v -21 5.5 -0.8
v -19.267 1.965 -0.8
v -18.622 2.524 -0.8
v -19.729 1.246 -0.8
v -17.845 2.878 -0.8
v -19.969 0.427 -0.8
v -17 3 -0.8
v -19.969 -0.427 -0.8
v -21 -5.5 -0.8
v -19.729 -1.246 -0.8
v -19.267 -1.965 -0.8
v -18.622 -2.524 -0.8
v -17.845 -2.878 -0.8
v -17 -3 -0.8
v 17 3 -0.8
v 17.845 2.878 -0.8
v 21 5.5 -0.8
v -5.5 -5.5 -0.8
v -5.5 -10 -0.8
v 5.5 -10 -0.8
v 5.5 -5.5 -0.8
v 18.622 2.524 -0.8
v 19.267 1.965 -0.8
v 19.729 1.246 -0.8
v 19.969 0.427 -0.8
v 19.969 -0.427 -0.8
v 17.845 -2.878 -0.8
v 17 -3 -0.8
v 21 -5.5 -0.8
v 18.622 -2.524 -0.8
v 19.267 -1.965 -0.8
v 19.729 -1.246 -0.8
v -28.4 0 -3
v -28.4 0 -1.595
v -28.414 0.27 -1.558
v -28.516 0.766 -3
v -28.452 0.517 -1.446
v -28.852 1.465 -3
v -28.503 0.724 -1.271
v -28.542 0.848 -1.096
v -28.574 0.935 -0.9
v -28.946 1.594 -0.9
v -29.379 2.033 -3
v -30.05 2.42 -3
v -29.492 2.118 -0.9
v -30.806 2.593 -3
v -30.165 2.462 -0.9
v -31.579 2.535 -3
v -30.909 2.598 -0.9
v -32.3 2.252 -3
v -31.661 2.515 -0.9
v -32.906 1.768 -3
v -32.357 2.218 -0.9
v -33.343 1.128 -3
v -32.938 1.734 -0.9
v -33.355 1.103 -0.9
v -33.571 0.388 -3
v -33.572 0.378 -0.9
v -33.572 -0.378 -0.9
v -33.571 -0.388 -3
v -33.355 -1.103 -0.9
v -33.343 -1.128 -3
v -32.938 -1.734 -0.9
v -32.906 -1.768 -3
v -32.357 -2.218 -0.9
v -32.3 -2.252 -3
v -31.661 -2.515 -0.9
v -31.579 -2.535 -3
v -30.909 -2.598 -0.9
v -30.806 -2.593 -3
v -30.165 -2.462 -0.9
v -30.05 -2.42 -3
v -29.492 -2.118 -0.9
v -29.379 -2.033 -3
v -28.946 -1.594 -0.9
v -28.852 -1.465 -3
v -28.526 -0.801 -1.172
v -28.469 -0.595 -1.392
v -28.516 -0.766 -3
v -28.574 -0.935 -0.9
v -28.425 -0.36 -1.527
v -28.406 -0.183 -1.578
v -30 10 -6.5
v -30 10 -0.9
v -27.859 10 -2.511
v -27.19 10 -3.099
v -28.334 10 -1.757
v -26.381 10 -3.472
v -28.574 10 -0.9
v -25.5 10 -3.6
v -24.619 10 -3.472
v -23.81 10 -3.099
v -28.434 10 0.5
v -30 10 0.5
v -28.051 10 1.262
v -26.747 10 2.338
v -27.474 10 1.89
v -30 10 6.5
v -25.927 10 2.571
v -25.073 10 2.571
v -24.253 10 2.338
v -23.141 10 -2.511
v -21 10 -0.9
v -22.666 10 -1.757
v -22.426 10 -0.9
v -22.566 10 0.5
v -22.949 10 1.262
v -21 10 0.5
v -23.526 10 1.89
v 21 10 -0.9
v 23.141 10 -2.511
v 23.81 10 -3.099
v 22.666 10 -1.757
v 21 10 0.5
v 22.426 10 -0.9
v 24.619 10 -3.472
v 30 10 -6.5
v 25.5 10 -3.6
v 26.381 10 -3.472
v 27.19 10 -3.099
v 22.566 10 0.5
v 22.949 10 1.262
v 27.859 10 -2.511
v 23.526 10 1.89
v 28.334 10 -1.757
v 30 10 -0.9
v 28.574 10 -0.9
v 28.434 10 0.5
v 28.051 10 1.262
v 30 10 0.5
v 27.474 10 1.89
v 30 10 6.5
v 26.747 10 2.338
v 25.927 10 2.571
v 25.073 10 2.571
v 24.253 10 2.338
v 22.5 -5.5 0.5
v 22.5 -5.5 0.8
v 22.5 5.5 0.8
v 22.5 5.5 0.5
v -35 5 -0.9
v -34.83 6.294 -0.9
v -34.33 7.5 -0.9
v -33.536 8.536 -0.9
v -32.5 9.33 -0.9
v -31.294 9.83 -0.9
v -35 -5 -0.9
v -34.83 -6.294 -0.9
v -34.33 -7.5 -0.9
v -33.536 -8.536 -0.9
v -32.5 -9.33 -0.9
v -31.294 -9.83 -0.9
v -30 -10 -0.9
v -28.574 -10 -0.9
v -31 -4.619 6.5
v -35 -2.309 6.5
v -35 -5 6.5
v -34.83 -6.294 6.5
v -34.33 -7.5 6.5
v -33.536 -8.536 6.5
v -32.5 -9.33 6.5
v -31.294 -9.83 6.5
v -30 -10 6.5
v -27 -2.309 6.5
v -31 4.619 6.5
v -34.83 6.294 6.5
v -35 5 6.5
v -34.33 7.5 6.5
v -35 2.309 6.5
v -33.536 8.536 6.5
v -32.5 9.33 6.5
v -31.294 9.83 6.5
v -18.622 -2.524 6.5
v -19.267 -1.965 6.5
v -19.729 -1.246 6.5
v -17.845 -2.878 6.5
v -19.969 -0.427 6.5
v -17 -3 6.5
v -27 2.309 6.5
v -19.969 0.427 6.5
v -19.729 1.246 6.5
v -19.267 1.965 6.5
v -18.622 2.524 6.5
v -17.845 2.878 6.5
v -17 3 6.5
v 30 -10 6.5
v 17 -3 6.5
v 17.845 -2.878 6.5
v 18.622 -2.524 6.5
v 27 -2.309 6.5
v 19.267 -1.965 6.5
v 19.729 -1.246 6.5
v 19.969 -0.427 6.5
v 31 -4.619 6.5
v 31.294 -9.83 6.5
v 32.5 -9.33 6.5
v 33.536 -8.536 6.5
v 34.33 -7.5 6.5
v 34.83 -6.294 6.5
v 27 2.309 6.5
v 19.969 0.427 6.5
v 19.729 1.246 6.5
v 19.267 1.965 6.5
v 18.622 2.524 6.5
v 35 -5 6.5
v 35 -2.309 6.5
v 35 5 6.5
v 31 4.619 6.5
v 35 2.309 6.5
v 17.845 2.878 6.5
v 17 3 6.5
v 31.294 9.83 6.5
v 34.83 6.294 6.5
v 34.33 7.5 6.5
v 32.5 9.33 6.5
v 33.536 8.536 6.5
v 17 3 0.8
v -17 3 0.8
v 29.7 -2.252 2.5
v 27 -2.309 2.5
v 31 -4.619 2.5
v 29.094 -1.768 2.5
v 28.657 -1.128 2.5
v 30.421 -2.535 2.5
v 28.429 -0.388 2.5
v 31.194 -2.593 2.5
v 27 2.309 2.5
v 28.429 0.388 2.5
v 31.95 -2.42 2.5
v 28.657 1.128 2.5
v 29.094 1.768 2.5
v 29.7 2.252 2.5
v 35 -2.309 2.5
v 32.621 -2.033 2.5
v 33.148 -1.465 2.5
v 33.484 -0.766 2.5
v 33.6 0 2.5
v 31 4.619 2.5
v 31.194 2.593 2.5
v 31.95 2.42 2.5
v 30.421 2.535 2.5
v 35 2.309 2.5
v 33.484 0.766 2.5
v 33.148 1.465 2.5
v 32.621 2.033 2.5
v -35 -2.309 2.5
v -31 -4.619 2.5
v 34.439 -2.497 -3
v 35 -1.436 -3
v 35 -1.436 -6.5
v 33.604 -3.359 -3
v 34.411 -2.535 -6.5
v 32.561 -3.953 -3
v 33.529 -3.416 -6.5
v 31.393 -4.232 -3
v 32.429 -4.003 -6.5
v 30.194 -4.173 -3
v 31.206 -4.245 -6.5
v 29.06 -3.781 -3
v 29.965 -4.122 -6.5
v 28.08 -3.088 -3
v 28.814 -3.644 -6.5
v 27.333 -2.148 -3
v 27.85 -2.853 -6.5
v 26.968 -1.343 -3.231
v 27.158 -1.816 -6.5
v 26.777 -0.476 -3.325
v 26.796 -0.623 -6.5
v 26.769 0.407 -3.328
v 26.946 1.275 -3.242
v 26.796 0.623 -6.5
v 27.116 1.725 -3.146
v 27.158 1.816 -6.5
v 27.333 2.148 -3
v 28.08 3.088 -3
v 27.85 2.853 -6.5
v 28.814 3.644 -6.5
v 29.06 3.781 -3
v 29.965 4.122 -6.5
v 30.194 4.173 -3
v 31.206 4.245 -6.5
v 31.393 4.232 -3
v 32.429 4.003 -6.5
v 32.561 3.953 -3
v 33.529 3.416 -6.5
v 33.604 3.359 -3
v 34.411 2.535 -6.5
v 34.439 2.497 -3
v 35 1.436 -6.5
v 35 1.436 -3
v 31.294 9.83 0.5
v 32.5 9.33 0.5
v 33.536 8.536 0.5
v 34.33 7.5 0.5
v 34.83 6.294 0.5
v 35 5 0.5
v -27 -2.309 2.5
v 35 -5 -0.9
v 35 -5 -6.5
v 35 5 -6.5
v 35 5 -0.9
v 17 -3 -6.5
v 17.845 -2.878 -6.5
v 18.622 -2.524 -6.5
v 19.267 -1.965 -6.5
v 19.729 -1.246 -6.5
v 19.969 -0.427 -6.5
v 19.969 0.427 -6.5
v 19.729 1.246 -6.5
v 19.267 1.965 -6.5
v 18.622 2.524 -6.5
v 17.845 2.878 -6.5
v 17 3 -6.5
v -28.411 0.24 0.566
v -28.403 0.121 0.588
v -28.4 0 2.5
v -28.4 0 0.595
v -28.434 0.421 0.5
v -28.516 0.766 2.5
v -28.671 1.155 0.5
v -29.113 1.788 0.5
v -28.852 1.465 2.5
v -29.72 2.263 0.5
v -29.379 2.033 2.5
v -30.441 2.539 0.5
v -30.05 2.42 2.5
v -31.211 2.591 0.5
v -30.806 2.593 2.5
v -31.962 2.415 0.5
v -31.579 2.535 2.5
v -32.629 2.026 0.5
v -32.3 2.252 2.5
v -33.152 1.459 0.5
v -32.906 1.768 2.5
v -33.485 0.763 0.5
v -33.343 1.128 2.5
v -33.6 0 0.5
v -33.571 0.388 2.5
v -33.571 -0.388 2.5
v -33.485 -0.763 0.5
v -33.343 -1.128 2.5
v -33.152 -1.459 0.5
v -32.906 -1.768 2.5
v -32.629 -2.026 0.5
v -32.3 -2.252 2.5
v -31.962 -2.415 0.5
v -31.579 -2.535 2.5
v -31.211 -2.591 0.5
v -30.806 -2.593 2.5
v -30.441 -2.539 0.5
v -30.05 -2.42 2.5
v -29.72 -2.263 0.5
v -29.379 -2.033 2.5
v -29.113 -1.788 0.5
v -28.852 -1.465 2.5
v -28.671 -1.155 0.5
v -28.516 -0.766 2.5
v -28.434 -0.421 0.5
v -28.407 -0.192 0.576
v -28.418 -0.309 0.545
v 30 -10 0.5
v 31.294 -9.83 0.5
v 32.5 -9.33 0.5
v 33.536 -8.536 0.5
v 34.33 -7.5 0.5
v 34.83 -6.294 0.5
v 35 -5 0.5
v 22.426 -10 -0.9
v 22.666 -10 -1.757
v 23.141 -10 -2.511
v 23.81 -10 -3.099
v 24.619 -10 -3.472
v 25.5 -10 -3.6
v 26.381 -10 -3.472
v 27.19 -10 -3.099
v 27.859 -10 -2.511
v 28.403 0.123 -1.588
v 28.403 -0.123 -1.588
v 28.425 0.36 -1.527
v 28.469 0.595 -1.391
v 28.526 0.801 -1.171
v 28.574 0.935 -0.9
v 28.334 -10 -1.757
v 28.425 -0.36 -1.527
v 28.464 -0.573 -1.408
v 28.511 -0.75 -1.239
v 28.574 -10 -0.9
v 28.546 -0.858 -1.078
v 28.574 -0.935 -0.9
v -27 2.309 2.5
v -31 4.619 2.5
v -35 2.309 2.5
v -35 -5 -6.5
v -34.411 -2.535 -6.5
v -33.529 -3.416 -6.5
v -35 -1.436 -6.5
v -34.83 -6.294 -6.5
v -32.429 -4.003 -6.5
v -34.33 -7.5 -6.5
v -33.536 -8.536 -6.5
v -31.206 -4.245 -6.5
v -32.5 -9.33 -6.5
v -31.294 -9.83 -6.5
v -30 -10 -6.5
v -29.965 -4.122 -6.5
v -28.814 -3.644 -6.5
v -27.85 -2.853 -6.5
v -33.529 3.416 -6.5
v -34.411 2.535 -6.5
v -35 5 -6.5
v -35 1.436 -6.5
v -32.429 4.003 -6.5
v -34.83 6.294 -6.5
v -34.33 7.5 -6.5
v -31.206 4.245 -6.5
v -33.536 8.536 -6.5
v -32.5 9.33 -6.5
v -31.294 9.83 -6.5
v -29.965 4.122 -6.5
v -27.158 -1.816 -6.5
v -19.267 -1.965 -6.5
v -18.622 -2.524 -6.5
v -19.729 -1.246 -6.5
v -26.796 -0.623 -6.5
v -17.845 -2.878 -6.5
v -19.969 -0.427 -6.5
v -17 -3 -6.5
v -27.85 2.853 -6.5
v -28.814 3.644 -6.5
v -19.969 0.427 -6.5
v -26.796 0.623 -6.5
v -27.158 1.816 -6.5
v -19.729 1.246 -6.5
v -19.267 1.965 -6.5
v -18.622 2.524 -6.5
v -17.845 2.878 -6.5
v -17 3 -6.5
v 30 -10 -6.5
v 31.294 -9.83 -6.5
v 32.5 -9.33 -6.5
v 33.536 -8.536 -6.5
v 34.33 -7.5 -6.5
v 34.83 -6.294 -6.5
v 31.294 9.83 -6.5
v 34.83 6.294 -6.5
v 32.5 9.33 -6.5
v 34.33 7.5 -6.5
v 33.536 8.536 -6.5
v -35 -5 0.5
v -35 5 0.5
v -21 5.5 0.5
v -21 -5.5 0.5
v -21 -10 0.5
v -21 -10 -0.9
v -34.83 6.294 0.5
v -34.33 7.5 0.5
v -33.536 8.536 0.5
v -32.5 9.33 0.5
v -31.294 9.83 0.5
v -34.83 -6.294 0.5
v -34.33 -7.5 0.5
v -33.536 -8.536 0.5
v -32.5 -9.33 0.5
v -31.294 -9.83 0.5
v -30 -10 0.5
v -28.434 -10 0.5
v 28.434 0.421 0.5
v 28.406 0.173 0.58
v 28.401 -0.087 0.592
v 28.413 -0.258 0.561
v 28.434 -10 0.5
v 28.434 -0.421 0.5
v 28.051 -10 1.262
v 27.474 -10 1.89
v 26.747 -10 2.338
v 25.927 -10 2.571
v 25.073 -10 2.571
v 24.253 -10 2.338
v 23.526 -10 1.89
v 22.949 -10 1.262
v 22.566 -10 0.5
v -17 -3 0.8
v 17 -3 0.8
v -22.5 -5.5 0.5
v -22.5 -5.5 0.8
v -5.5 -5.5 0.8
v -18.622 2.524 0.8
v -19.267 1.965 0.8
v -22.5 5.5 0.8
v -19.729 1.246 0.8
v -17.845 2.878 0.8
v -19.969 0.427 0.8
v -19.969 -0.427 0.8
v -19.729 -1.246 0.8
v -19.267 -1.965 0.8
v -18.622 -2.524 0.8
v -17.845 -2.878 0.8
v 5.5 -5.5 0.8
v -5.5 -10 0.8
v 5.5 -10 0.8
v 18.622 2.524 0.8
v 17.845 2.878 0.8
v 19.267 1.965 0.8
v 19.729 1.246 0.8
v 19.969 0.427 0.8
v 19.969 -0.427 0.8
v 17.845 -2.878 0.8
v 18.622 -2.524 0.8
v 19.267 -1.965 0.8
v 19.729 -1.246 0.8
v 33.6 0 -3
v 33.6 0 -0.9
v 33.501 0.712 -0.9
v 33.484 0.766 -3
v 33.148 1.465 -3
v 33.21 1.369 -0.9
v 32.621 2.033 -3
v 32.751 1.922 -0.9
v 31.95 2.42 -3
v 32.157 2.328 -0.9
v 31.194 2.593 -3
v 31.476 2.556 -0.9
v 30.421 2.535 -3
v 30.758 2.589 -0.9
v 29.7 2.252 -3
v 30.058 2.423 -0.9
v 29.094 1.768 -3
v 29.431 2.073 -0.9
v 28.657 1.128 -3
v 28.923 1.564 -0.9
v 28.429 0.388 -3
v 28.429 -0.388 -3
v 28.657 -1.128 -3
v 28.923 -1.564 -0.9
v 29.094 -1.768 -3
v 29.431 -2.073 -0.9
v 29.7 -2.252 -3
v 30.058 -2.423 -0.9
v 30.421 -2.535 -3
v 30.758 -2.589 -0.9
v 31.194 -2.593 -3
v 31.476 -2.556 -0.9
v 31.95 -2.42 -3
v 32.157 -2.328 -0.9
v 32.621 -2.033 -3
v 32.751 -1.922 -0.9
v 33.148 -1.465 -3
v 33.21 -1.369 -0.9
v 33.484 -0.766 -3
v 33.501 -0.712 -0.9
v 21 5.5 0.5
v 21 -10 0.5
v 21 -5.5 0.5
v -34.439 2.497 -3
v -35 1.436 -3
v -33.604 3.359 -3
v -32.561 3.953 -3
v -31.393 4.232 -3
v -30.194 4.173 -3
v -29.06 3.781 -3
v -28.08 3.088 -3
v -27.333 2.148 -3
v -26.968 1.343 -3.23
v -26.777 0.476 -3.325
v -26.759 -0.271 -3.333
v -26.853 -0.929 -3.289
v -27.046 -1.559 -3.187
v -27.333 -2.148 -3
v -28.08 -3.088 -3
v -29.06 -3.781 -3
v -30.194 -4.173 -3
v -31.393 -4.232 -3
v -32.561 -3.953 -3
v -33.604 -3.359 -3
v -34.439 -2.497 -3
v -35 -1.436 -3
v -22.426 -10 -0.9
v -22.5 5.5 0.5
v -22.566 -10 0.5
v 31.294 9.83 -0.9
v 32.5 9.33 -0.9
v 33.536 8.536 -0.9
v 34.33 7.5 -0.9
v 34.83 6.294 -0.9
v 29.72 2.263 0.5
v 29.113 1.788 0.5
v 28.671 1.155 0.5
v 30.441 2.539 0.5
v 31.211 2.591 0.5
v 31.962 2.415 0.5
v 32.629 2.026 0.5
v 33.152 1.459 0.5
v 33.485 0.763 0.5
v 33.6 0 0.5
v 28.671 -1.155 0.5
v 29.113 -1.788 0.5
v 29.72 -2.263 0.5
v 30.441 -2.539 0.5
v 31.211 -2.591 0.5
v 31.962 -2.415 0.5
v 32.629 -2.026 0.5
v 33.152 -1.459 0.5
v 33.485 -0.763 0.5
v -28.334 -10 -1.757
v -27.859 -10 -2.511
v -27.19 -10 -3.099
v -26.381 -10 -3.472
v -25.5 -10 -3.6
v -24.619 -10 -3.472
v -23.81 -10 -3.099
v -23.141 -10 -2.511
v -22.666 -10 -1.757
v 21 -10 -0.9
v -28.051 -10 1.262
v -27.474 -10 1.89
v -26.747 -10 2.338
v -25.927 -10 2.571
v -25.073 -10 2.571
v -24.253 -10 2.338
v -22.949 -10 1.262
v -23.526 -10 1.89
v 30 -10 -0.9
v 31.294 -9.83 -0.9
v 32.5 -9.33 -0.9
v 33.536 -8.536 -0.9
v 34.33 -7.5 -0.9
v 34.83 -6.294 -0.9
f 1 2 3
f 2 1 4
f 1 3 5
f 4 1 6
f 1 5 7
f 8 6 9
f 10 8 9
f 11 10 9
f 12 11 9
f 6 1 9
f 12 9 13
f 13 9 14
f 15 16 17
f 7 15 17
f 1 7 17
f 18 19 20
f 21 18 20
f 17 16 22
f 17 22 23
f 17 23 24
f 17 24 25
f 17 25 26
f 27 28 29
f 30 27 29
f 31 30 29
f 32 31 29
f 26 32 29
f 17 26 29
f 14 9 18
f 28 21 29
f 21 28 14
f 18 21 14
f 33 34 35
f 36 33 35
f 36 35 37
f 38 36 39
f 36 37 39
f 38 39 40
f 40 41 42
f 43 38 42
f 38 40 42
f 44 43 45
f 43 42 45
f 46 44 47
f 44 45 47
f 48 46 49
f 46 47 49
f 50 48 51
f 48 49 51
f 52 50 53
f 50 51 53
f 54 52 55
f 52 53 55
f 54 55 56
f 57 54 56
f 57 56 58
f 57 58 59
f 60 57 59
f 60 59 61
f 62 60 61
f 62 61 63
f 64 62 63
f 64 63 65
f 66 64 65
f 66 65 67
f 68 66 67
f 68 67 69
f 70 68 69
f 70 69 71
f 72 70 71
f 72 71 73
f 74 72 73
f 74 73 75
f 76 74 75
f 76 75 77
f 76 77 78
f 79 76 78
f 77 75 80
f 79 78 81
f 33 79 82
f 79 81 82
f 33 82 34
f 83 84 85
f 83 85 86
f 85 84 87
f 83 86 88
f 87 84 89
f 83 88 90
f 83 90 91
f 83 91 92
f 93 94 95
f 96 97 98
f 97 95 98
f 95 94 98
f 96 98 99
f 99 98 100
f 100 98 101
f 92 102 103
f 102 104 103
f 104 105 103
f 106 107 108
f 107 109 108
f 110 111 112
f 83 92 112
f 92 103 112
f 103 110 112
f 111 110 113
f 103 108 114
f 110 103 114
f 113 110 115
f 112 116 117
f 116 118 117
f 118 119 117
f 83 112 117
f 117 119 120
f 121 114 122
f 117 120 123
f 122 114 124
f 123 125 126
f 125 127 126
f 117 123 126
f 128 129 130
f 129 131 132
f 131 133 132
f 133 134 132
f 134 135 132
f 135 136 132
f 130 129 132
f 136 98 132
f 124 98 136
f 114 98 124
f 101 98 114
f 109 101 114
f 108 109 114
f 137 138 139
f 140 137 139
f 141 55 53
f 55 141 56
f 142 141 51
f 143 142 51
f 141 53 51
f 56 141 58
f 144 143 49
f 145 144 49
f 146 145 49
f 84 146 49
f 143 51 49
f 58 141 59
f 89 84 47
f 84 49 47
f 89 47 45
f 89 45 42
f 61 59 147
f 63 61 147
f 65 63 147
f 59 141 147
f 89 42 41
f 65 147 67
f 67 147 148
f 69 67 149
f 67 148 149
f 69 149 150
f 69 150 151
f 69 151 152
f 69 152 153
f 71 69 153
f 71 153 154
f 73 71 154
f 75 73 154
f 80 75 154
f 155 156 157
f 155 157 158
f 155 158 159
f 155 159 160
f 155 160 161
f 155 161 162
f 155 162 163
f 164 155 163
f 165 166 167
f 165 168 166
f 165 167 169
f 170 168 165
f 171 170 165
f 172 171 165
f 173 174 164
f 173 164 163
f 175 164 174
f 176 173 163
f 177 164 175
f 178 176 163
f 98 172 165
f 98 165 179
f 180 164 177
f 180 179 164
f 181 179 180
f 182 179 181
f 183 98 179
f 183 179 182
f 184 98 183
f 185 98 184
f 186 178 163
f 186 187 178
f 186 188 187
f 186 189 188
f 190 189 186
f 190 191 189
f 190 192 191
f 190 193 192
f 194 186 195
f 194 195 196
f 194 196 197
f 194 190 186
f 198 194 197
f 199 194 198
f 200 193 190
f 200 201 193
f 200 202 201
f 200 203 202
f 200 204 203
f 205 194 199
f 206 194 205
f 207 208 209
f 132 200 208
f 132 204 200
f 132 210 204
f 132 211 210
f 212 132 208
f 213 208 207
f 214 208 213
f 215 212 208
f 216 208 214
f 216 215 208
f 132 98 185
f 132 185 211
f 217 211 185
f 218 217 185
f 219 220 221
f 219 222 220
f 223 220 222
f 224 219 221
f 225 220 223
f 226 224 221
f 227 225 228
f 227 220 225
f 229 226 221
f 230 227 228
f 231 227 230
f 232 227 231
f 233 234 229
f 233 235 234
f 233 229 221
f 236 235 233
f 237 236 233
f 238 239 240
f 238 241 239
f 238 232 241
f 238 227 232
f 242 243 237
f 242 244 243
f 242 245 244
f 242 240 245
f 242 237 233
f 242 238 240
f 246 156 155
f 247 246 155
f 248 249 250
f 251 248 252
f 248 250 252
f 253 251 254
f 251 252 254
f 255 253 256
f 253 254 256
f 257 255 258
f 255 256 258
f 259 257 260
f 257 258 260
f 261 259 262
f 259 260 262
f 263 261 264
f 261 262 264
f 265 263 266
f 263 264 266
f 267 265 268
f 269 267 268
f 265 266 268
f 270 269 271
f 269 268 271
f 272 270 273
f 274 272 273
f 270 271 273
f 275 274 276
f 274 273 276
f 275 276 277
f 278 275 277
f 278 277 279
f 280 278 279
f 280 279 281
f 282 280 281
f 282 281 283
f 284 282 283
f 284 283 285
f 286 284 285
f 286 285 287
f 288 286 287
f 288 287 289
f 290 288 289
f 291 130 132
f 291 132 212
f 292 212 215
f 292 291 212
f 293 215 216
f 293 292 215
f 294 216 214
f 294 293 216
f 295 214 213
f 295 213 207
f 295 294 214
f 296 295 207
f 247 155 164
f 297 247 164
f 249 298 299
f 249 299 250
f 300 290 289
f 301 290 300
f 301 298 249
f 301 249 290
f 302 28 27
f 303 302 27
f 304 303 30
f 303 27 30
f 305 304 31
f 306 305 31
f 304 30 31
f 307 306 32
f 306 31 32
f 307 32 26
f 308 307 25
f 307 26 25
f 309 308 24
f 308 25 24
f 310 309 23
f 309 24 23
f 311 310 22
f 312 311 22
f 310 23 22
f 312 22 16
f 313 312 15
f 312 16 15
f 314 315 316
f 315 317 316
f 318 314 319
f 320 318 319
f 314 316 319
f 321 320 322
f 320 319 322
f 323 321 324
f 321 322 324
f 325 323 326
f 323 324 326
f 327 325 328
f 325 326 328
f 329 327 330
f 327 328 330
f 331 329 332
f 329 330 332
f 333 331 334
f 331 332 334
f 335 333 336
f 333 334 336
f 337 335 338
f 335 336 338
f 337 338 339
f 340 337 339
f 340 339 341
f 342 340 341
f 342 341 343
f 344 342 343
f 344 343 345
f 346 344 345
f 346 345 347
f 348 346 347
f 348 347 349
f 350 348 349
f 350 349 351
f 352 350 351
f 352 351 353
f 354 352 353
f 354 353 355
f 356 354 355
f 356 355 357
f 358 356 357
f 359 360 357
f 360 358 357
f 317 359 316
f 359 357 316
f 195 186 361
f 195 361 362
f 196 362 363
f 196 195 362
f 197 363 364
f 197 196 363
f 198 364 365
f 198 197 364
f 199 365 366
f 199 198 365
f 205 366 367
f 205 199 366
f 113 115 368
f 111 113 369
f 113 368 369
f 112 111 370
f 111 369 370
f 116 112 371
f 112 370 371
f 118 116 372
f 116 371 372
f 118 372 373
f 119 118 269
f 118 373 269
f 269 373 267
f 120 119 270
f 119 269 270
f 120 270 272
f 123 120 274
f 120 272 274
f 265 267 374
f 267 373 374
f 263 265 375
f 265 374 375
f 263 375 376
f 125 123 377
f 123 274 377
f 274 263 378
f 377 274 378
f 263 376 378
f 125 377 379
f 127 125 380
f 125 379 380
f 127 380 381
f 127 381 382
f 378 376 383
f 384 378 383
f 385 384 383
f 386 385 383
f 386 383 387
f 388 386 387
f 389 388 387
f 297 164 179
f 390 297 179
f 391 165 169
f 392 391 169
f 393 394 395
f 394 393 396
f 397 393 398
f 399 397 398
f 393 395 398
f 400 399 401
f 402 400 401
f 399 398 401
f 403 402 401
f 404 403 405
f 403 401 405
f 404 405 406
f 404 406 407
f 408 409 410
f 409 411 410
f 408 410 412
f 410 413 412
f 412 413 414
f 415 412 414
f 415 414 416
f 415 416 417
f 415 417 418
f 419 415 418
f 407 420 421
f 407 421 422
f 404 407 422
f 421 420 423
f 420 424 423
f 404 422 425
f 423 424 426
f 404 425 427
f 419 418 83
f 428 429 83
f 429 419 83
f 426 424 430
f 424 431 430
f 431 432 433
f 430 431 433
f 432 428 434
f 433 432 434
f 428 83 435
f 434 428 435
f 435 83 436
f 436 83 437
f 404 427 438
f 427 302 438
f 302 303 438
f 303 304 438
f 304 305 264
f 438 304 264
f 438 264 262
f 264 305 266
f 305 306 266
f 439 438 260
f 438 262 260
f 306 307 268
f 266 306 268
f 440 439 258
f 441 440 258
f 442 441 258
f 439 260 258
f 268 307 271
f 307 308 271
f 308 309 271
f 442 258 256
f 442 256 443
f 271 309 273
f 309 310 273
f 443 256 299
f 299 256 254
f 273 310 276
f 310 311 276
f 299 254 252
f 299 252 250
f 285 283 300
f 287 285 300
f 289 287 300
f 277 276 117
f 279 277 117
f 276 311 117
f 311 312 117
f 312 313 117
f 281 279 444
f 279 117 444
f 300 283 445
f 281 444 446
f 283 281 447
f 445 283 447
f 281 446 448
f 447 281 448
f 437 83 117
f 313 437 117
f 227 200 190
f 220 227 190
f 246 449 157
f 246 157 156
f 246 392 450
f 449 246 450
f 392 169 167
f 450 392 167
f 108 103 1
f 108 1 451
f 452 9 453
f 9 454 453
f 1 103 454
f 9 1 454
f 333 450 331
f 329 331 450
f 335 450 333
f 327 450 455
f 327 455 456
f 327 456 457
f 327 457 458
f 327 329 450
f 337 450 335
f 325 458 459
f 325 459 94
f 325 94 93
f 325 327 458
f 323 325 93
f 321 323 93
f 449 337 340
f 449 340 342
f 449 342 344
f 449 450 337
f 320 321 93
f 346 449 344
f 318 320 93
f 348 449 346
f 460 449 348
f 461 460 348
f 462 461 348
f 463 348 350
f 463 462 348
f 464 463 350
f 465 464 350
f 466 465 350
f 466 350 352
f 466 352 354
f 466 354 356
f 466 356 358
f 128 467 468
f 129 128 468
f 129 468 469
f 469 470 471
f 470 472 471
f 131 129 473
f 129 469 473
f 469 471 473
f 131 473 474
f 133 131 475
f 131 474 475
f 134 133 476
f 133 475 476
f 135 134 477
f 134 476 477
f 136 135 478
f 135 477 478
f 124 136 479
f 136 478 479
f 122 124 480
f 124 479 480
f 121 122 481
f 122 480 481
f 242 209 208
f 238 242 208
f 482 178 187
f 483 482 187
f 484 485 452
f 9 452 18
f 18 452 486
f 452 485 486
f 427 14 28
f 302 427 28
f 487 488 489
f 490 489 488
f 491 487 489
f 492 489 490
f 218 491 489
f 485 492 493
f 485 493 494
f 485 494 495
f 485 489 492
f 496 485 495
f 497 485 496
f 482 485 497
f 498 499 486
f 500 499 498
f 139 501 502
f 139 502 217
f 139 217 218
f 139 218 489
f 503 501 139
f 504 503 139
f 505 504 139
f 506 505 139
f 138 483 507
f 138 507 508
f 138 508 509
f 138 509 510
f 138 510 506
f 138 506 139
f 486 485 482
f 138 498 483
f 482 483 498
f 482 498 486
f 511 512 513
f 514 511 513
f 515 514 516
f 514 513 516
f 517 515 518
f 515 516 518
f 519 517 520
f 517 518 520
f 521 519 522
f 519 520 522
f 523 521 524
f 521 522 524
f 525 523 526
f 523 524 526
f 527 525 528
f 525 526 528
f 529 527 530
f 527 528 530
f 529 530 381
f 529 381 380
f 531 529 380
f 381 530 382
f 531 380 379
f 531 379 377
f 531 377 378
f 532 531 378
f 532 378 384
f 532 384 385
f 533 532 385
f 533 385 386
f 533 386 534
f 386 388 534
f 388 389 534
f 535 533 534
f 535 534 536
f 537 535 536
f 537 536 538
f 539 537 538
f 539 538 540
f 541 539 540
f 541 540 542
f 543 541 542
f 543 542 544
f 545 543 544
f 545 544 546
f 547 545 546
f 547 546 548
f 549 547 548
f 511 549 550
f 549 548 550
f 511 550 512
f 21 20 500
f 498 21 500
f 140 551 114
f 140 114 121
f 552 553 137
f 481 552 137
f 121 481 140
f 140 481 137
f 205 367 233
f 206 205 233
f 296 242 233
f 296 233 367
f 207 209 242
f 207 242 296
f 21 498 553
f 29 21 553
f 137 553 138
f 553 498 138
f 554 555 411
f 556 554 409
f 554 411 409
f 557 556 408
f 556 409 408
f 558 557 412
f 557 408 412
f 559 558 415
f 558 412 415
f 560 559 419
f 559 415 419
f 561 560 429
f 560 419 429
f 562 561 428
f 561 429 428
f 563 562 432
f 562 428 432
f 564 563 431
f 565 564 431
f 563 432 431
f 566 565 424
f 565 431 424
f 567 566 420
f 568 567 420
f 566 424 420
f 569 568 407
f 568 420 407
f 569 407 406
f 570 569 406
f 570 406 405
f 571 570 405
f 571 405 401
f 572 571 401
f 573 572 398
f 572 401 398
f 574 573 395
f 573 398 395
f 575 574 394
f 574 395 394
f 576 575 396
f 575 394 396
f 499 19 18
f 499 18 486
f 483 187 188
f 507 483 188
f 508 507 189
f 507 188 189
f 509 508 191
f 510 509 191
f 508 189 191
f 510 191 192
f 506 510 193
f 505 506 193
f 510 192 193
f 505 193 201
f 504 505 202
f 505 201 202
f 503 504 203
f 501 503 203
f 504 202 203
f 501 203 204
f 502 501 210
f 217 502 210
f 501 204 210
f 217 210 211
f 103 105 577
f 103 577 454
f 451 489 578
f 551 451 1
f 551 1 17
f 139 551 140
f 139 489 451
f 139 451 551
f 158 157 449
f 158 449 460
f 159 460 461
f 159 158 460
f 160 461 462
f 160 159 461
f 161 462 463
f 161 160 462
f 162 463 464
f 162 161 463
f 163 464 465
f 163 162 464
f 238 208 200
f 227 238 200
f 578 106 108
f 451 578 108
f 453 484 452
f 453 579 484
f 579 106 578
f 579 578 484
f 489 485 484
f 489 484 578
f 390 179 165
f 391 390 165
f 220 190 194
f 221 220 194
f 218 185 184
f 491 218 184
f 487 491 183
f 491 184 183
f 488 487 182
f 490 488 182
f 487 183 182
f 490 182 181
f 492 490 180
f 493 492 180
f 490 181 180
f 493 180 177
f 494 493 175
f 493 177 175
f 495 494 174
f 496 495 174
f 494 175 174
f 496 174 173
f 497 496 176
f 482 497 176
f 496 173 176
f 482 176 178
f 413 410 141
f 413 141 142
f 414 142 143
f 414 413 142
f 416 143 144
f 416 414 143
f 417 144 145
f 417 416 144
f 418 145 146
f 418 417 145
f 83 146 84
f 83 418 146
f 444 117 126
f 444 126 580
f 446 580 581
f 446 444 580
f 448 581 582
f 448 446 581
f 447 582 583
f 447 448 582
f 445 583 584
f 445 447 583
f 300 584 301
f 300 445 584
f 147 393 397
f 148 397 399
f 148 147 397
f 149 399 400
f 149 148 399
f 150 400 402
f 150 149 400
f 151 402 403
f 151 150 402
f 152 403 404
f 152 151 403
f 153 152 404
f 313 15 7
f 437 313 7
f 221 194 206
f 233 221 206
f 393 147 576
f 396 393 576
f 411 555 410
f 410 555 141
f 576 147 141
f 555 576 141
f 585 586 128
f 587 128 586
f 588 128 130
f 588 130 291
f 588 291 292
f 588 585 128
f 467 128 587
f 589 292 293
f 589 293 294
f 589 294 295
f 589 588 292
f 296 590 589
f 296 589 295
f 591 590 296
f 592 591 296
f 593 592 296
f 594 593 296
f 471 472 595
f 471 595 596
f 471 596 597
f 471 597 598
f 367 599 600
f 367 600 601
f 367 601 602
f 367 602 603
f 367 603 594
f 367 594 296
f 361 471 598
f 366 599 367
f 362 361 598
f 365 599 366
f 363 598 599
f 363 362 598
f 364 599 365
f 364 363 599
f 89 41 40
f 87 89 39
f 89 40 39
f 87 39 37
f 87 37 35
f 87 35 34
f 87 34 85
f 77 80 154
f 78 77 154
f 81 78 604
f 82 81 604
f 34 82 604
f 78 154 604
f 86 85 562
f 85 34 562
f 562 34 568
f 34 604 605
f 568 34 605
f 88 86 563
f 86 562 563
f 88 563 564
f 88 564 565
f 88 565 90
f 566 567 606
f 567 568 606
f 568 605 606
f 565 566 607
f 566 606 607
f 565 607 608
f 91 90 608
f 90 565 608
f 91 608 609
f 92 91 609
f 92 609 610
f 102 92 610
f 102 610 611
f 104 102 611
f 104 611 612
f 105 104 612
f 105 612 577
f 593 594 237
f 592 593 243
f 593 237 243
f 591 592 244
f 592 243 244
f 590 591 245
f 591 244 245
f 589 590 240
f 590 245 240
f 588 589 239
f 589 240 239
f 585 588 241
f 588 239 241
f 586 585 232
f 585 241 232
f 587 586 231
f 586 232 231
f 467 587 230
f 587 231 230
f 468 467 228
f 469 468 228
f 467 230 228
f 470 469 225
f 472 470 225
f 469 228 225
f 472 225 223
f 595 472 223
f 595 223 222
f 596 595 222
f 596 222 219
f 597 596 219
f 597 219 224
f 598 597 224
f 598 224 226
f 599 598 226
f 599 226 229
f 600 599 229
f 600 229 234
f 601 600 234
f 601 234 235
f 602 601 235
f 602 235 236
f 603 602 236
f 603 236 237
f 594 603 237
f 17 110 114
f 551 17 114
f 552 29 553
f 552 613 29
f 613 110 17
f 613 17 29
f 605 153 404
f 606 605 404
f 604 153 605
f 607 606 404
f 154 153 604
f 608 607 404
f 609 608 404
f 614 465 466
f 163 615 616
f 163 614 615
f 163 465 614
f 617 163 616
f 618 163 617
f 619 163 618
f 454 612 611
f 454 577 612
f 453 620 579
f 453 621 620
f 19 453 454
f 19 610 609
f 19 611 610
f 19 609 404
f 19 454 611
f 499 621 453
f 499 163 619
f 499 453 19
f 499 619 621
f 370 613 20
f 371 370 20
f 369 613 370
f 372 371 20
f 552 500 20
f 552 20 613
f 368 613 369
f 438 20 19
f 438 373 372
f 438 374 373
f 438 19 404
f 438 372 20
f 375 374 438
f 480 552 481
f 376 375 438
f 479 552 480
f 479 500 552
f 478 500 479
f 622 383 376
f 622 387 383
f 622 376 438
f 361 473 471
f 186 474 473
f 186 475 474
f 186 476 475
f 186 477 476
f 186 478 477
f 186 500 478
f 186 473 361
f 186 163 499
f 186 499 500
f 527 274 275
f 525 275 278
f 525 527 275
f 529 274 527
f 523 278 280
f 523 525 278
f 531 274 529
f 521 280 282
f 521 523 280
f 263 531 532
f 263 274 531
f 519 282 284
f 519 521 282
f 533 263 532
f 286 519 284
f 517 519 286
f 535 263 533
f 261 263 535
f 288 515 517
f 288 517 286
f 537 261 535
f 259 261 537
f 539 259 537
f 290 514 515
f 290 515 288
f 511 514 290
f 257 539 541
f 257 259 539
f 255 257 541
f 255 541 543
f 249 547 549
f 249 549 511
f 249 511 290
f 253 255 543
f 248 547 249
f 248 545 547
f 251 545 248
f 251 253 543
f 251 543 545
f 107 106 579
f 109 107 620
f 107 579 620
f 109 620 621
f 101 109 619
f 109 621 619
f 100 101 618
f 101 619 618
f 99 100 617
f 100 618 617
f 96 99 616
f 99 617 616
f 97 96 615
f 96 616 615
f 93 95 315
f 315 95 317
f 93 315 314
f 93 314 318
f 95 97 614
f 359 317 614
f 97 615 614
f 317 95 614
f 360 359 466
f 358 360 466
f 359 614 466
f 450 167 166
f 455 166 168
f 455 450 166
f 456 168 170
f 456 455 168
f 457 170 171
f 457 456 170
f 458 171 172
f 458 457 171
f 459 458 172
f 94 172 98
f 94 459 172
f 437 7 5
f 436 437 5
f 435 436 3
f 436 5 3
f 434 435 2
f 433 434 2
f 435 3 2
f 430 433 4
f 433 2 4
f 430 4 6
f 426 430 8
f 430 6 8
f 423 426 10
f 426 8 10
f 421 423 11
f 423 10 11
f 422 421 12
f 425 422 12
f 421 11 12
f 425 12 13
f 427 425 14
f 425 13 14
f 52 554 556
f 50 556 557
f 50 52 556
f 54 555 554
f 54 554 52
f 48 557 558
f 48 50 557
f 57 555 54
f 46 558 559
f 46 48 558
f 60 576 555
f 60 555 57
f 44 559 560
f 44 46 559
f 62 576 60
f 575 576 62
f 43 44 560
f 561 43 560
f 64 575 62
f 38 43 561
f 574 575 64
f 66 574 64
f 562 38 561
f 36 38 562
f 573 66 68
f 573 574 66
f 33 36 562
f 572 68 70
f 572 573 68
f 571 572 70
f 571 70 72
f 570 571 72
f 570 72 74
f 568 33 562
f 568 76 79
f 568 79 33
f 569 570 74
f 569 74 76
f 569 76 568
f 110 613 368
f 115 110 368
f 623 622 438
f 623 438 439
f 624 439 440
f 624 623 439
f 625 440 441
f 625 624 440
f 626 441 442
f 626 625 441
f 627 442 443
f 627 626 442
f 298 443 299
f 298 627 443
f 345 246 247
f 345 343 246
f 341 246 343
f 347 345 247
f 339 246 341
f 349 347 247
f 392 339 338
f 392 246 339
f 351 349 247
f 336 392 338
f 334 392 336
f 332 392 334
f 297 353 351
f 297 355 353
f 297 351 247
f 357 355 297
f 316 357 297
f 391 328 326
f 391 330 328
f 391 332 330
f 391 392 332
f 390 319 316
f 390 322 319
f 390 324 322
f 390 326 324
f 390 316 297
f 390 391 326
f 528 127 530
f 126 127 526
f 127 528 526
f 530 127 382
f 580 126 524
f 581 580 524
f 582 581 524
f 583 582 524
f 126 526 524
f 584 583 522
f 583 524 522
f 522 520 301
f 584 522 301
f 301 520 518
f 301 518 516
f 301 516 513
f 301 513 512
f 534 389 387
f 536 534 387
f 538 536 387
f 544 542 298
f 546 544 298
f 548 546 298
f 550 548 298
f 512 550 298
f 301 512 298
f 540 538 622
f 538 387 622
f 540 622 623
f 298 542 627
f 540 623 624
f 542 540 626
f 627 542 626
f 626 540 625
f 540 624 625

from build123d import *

# Parameters (mm, degrees)
F0_W      = 70
F0_H      = 20
F1_DEPTH  = 6.5
F4_DEPTH  = 4
F5_R      = 2.6
F6_DEPTH  = 13.001
F7_DEPTH  = 13.001
F9_R      = 5
F8_R      = 3.1
F10_DEPTH = 20.001
F11_W     = 45
F11_H     = 11
F12_DEPTH = 0.8
F13_W     = 11
F13_H     = 1.6
F14_DEPTH = 4.5
F15_W     = 14
F15_H     = 1.4
F16_DEPTH = 20.0010001
F17_R     = 4.25
F18_DEPTH = 3.5


with BuildPart() as f1:
    # F0 (on Top) → F1 (new body, symmetric)
    with BuildSketch(Plane.XY):
        Rectangle(F0_W, F0_H)
    extrude(amount=F1_DEPTH, both=True)

    # F3 (on face) → F4 (cut)
    with BuildSketch(Plane.XY.offset(6.5)):
        Polygon((-31, -4.6188021535), (-27, -2.3094010768), (-27, 2.3094010768), (-31, 4.6188021535), (-35, 2.3094010768), (-35, -2.3094010768), align=None)
        Polygon((35, -2.3094010768), (35, 2.3094010768), (31, 4.6188021535), (27, 2.3094010768), (27, -2.3094010768), (31, -4.6188021535), align=None)
    extrude(amount=-F4_DEPTH, mode=Mode.SUBTRACT)

    # F5 (on face) → F6 (cut, through all)
    with BuildSketch(Plane.XY.offset(6.5)):
        with Locations((-31, 0)):
            Circle(F5_R)
        with Locations((31, 0)):
            Circle(F5_R)
    extrude(amount=-F6_DEPTH, mode=Mode.SUBTRACT)

    # F2 (on face) → F7 (cut, through all)
    with BuildSketch(Plane.XY.offset(6.5)):
        with BuildLine():
            Line((-17, -3), (17, -3))
            ThreePointArc((17, -3), (20, 0), (17, 3))
            Line((17, 3), (-17, 3))
            ThreePointArc((-17, 3), (-20, 0), (-17, -3))
        make_face()
    extrude(amount=-F7_DEPTH, mode=Mode.SUBTRACT)

    # F9
    f9_edges = [f1.edges().sort_by_distance(p)[0] for p in [
        (35, -10, 0),
        (-35, -10, 0),
        (35, 10, 0),
        (-35, 10, 0),
    ]]
    fillet(f9_edges, radius=F9_R)

    # F8 (on face) → F10 (cut, through all)
    with BuildSketch(Plane.XZ.offset(10)):
        with Locations((-25.5, -0.5)):
            Circle(F8_R)
        with Locations((25.5, -0.5)):
            Circle(F8_R)
    extrude(amount=-F10_DEPTH, mode=Mode.SUBTRACT)

    # F11 (on Top) → F12 (cut, symmetric)
    with BuildSketch(Plane.XY):
        Rectangle(F11_W, F11_H)
    extrude(amount=F12_DEPTH, both=True, mode=Mode.SUBTRACT)

    # F13 (on face) → F14 (cut, through all)
    with BuildSketch(Plane.XZ.offset(10)):
        Rectangle(F13_W, F13_H)
    extrude(amount=-F14_DEPTH, mode=Mode.SUBTRACT)

    # F15 (on face) → F16 (cut, through all)
    with BuildSketch(Plane.XZ.offset(10)):
        with Locations((-28, -0.2)):
            Rectangle(F15_W, F15_H)
        with Locations((28, -0.2)):
            Rectangle(F15_W, F15_H)
    extrude(amount=-F16_DEPTH, mode=Mode.SUBTRACT)

    # F17 (on face) → F18 (cut)
    with BuildSketch(Plane(origin=(0, 0, -6.5), x_dir=(1, 0, 0), z_dir=(0, 0, -1))):
        with Locations((31, 0)):
            Circle(F17_R)
        with Locations((-31, 0)):
            Circle(F17_R)
    extrude(amount=-F18_DEPTH, mode=Mode.SUBTRACT)


solid = f1.part
